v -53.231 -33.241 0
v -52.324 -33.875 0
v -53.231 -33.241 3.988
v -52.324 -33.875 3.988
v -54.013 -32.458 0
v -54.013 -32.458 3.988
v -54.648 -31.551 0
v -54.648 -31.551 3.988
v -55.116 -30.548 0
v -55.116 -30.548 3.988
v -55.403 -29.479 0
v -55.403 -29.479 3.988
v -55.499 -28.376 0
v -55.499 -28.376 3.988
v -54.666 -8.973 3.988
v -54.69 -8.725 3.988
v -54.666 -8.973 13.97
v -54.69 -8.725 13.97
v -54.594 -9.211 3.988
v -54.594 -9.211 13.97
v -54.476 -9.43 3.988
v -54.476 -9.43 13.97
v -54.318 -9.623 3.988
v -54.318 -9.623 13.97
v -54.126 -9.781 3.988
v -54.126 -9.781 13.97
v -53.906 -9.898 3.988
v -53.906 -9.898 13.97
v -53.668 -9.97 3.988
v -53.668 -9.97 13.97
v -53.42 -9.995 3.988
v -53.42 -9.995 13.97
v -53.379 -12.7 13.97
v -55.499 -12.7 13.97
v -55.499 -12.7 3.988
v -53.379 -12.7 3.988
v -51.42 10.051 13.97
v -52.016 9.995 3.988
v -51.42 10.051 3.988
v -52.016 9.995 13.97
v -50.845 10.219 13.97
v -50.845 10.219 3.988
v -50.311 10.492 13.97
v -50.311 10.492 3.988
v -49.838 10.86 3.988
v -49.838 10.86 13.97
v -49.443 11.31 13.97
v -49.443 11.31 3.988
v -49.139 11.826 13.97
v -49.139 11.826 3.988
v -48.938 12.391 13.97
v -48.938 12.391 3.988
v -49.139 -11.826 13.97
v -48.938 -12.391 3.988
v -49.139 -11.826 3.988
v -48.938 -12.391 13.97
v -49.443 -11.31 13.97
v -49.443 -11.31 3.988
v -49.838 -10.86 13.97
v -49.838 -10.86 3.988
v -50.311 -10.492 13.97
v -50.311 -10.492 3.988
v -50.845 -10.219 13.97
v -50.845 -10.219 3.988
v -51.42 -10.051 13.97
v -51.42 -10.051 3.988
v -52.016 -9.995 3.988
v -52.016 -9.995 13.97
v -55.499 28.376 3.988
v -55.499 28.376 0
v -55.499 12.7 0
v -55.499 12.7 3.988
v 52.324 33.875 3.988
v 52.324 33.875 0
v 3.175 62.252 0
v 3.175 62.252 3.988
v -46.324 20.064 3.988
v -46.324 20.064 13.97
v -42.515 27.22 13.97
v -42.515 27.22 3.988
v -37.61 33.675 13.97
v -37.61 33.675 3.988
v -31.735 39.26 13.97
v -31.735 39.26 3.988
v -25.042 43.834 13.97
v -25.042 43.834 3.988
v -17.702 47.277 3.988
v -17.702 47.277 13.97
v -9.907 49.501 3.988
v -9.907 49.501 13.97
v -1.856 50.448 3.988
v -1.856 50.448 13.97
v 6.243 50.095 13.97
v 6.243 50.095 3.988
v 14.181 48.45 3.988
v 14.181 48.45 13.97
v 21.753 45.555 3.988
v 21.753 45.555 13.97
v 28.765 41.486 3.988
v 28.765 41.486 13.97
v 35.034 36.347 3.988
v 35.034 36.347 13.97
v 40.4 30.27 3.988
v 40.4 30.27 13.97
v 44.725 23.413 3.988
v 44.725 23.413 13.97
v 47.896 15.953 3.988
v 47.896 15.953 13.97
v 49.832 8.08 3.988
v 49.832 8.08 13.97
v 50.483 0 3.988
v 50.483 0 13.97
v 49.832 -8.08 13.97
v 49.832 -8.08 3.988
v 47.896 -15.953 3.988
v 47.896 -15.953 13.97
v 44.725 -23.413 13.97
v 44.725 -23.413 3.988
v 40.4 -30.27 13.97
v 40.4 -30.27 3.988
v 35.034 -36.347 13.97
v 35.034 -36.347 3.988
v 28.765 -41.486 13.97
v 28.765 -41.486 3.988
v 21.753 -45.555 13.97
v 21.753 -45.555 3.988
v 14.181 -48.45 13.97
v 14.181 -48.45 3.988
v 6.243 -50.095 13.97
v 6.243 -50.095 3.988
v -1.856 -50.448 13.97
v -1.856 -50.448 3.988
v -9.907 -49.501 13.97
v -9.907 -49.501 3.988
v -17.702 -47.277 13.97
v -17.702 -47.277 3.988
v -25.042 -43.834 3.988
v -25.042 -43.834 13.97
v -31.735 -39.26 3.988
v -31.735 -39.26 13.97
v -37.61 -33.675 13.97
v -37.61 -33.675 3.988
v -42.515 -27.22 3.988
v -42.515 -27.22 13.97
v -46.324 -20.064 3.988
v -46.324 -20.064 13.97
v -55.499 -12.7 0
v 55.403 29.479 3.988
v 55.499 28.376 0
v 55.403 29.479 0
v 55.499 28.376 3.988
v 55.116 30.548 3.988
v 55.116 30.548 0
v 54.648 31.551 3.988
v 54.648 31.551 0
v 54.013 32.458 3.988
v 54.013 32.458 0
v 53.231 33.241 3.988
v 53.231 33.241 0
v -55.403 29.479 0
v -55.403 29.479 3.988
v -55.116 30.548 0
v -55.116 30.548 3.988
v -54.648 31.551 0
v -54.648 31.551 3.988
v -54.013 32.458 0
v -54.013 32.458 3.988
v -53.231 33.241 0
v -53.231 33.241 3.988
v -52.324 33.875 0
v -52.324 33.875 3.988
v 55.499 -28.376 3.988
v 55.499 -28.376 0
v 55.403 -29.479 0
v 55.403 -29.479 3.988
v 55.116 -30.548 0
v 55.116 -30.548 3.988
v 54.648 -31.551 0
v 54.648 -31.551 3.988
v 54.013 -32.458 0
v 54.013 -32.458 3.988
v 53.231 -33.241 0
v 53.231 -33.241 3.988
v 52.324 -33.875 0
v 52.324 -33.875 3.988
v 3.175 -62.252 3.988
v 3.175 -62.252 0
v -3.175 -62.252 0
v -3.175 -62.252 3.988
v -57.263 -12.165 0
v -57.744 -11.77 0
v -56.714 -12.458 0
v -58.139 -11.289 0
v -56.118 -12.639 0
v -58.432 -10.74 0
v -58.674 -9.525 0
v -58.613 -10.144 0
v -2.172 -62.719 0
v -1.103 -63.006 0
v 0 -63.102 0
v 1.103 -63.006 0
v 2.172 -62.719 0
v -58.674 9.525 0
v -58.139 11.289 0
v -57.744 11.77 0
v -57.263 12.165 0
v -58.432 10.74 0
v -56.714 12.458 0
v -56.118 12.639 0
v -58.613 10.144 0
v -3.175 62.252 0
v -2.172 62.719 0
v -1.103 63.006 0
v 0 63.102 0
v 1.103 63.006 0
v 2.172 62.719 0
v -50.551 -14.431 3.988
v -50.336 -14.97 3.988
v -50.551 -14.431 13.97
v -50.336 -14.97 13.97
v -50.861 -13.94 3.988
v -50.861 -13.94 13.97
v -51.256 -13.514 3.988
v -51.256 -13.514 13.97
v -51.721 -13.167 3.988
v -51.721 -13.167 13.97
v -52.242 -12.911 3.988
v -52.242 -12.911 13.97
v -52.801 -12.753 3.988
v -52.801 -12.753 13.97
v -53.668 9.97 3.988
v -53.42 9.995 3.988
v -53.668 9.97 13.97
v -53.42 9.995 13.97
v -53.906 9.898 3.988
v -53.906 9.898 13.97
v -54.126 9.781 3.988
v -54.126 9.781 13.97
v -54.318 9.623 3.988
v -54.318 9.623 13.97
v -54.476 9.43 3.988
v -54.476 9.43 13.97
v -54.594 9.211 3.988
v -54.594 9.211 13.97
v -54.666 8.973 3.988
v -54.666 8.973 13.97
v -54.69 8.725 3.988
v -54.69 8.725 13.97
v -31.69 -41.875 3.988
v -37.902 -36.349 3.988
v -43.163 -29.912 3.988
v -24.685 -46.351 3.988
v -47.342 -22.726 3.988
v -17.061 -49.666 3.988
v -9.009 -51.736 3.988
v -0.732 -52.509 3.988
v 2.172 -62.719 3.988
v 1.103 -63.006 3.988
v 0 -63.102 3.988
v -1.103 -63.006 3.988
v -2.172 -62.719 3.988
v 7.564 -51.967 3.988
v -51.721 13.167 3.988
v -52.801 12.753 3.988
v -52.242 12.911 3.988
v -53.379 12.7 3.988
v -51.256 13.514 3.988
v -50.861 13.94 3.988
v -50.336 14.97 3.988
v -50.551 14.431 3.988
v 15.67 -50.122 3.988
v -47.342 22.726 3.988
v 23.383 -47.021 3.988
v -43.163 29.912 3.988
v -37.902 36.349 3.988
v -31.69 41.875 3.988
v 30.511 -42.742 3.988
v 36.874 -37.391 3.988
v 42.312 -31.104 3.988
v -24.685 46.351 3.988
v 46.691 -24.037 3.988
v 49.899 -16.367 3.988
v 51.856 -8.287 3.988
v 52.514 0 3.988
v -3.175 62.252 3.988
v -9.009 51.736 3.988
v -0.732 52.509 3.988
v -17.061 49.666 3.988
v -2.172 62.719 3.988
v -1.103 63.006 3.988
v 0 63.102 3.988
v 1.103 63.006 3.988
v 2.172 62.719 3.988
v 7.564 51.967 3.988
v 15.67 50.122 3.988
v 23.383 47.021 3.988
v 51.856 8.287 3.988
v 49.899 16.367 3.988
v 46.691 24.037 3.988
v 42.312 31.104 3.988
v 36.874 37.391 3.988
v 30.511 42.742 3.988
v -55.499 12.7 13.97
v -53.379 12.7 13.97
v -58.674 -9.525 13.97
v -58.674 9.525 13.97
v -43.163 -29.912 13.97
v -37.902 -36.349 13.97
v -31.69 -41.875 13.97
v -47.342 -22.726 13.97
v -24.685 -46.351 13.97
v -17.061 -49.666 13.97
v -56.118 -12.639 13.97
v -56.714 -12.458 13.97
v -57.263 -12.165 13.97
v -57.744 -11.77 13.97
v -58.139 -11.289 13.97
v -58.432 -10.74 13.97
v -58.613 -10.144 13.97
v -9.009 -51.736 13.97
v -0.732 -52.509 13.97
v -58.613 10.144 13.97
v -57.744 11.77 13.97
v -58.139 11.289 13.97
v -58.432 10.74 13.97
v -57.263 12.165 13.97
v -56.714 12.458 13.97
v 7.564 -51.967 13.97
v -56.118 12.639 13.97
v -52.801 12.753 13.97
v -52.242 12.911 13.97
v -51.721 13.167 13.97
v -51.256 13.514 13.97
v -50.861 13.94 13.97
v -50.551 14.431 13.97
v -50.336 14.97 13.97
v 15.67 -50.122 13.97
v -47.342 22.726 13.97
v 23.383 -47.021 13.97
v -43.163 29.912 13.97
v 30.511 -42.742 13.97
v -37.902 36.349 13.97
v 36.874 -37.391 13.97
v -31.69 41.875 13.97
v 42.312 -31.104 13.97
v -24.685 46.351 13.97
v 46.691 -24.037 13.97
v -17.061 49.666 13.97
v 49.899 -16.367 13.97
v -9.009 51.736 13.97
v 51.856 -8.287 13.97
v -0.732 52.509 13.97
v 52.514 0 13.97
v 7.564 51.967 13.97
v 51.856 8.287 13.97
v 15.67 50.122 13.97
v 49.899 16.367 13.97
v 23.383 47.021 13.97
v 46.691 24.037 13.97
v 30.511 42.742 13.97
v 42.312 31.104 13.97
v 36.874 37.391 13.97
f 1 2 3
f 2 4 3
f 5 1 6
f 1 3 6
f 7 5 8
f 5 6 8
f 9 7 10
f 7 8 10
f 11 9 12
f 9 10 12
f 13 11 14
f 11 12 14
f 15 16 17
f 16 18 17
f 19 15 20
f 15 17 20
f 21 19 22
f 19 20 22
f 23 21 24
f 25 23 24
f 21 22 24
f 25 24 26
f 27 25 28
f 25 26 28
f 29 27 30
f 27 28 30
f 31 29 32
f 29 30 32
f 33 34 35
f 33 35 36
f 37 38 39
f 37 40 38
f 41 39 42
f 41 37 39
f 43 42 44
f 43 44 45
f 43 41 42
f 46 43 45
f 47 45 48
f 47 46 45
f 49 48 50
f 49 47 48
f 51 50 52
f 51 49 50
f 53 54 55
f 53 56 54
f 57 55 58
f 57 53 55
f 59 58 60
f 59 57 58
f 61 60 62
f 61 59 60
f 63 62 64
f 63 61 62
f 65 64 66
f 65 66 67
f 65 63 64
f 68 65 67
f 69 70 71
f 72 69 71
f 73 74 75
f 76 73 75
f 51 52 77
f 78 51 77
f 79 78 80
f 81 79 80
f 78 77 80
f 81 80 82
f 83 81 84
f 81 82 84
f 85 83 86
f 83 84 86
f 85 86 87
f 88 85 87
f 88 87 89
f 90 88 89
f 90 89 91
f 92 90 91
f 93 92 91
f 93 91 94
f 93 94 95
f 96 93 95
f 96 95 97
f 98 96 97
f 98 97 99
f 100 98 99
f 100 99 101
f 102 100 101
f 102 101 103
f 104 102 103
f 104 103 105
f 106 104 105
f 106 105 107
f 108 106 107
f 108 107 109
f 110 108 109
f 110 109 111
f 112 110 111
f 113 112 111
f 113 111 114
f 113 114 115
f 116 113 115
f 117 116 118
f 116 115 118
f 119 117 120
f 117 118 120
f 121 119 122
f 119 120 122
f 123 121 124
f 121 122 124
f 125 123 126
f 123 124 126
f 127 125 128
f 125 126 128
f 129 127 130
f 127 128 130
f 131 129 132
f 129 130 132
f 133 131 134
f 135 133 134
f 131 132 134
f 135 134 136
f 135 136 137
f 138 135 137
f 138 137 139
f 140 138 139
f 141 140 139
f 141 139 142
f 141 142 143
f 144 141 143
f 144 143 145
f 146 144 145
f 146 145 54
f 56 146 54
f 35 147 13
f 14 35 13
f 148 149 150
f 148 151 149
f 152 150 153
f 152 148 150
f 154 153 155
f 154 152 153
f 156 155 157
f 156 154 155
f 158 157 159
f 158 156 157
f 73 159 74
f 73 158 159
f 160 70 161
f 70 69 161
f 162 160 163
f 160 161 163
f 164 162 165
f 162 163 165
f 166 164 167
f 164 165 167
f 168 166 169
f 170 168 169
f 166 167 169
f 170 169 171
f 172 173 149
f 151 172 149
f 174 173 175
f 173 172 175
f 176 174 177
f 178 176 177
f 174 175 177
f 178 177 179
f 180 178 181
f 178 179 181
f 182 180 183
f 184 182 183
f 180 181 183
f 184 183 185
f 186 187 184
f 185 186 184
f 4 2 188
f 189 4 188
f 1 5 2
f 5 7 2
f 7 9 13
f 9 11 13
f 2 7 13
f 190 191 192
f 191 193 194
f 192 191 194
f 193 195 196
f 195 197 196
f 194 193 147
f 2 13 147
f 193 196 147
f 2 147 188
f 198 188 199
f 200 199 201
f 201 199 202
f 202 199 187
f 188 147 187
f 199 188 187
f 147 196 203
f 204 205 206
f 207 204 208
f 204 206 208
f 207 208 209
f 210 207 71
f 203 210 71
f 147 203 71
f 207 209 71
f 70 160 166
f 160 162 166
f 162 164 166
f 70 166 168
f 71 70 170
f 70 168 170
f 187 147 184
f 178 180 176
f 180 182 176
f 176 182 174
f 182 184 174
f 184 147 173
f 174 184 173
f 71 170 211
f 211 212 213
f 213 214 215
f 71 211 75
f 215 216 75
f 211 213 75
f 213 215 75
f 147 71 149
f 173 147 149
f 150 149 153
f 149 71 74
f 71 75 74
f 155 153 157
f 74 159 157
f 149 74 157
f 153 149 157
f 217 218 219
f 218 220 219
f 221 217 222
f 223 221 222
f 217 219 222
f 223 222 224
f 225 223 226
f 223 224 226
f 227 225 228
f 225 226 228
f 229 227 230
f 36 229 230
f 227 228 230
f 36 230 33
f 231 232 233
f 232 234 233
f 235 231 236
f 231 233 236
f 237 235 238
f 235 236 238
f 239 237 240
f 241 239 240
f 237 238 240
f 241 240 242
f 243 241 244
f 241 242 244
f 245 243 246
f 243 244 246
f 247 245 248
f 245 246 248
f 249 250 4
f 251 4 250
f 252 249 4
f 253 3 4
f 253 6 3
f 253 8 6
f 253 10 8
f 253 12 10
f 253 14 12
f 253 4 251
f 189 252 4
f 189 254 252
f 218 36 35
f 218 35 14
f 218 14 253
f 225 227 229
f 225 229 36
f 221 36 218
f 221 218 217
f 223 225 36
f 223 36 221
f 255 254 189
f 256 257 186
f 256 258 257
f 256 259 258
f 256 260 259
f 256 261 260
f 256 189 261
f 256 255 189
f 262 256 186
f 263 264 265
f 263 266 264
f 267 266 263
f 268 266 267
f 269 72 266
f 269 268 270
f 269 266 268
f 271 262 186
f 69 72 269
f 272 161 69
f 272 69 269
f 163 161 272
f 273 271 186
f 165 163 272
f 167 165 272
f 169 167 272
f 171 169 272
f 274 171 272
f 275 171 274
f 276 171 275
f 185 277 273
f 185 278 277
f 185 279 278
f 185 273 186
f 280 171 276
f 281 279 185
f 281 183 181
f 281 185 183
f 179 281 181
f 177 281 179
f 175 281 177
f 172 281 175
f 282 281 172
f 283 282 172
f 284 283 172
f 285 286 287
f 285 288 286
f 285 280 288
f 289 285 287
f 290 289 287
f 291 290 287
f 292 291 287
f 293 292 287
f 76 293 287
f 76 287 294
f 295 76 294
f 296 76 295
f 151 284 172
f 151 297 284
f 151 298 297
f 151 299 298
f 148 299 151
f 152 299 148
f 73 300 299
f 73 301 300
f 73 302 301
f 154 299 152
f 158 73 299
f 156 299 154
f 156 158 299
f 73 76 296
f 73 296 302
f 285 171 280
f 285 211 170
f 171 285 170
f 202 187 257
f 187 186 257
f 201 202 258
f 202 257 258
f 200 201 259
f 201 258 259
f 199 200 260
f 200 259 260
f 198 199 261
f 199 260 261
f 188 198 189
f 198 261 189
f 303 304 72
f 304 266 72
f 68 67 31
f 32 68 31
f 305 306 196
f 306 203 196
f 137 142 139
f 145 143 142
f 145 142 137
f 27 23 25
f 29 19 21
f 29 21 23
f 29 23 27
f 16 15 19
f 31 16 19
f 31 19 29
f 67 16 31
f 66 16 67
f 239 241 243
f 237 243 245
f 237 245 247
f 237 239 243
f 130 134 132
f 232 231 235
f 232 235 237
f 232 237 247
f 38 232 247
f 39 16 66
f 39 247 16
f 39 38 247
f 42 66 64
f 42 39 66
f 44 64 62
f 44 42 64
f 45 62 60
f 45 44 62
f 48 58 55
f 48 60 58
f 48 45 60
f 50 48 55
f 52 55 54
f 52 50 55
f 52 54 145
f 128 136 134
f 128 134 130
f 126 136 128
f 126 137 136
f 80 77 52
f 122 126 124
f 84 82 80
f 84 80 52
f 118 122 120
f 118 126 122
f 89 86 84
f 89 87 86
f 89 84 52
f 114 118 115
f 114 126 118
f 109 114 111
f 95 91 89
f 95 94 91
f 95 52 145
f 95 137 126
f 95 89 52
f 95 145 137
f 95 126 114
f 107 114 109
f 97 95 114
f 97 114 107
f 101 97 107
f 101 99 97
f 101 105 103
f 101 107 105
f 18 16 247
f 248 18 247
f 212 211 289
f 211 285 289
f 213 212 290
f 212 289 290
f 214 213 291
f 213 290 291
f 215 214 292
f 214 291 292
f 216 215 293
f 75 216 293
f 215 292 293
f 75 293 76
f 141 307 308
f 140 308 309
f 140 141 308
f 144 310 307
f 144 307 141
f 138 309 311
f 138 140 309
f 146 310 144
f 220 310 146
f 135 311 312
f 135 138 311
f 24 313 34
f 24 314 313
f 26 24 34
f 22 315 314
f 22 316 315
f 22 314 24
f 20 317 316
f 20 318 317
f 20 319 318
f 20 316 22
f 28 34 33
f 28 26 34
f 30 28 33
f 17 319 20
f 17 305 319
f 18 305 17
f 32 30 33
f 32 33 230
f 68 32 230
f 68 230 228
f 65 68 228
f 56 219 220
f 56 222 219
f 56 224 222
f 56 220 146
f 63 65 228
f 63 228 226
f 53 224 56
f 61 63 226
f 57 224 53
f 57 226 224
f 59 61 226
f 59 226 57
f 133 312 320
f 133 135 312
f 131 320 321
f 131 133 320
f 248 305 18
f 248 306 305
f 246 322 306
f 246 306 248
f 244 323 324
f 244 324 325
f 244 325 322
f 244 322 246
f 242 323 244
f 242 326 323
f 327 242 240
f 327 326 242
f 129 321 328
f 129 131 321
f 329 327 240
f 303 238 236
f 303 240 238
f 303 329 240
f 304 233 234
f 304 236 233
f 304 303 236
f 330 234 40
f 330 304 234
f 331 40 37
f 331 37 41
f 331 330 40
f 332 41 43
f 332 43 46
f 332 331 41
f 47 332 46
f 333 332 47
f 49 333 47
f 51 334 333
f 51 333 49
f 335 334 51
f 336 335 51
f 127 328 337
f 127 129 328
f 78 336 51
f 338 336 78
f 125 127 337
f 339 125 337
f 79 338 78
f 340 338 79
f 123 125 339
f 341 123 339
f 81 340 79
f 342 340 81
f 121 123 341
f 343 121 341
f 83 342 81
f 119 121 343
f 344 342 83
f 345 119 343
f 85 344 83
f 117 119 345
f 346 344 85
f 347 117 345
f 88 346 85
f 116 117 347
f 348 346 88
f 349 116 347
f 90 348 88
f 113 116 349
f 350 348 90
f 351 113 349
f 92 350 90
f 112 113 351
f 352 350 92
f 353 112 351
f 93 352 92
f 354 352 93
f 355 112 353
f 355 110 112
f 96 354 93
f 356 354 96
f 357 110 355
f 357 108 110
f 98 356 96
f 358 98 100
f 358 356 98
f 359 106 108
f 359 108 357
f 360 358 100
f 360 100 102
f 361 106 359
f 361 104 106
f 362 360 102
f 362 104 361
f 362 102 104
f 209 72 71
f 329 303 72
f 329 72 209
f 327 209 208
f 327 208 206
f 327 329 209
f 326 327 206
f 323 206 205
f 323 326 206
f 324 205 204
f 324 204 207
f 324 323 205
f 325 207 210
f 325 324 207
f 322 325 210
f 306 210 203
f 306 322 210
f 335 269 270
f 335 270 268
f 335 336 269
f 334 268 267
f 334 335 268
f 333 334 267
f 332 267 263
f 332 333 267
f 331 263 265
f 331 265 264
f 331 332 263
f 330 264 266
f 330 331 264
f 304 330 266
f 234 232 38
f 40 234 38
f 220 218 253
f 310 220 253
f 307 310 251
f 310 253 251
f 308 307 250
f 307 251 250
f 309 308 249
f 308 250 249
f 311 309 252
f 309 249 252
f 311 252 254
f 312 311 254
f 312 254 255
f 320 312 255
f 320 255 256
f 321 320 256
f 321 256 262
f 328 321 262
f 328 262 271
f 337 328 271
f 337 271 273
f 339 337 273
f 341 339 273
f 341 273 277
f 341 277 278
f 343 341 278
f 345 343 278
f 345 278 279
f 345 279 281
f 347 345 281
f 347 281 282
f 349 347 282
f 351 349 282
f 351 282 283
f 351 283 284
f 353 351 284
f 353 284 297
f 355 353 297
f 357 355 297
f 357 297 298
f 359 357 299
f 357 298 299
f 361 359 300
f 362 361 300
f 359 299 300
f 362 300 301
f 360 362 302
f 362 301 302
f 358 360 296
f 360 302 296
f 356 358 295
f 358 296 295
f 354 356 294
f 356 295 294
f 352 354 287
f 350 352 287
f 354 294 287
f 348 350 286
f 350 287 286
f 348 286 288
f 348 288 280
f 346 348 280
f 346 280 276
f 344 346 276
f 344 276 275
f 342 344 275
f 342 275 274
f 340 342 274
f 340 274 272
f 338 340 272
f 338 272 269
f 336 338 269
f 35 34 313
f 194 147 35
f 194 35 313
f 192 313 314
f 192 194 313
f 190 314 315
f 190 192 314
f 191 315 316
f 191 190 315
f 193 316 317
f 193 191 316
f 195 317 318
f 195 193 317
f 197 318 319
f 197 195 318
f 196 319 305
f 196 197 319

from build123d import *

# Parameters (mm, degrees)
F1_DEPTH = 3.9878
F2_W     = 3.175
F2_H     = 25.4
F3_DEPTH = 3.9878
F5_DEPTH = 9.9822
F6_R     = 6.35
F7_R     = 1.27
F8_R     = 3.175


with BuildPart() as f1:
    # F0 (on Top) → F1 (new body)
    with BuildSketch(Plane.XY):
        Polygon((55.499, 32.042363), (0, 64.084725), (-55.499, 32.042363), (-55.499, -32.042363), (0, -64.084725), (55.499, -32.042363), align=None)
    extrude(amount=F1_DEPTH)

    # F2 (on face) → F3 (join, through all)
    with BuildSketch(Plane.XY.offset(3.9878)):
        with Locations((-57.0865, 0)):
            Rectangle(F2_W, F2_H)
    extrude(amount=-F3_DEPTH)

    # F4 (on face) → F5 (join)
    with BuildSketch(Plane.XY.offset(3.9878)):
        with BuildLine():
            Line((-55.499, -12.7), (-50.955694, -12.7))
            ThreePointArc((-50.955694, -12.7), (52.5145, 0), (-50.955694, 12.7))
            Line((-50.955694, 12.7), (-55.499, 12.7))
            Line((-55.499, 12.7), (-58.674, 12.7))
            Line((-58.674, 12.7), (-58.674, -12.7))
            Line((-58.674, -12.7), (-55.499, -12.7))
        make_face()
        with BuildLine():
            ThreePointArc((-49.483177, 9.9949), (50.4825, 0), (-49.483177, -9.9949))
            Line((-49.483177, -9.9949), (-54.690177, -9.9949))
            Line((-54.690177, -9.9949), (-54.690177, 9.9949))
            Line((-54.690177, 9.9949), (-49.483177, 9.9949))
        make_face(mode=Mode.SUBTRACT)
    extrude(amount=F5_DEPTH)

    # F6
    f6_edges = [f1.edges().sort_by_distance(p)[0] for p in [
        (-55.499, -32.042363, 1.9939),
        (0, -64.084725, 1.9939),
        (55.499, -32.042363, 1.9939),
        (55.499, 32.042363, 1.9939),
        (0, 64.084725, 1.9939),
        (-55.499, 32.042363, 1.9939),
    ]]
    fillet(f6_edges, radius=F6_R)

    # F7
    f7_edges = [f1.edges().sort_by_distance(p)[0] for p in [
        (-54.690177, -9.9949, 8.9789),
        (-54.690177, 9.9949, 8.9789),
    ]]
    fillet(f7_edges, radius=F7_R)

    # F8
    f8_edges = [f1.edges().sort_by_distance(p)[0] for p in [
        (-49.483177, -9.9949, 8.9789),
        (-49.483177, 9.9949, 8.9789),
        (-50.955694, 12.7, 8.9789),
        (-58.674, 12.7, 6.985),
        (-58.674, -12.7, 6.985),
        (-50.955694, -12.7, 8.9789),
    ]]
    fillet(f8_edges, radius=F8_R)


solid = f1.part
